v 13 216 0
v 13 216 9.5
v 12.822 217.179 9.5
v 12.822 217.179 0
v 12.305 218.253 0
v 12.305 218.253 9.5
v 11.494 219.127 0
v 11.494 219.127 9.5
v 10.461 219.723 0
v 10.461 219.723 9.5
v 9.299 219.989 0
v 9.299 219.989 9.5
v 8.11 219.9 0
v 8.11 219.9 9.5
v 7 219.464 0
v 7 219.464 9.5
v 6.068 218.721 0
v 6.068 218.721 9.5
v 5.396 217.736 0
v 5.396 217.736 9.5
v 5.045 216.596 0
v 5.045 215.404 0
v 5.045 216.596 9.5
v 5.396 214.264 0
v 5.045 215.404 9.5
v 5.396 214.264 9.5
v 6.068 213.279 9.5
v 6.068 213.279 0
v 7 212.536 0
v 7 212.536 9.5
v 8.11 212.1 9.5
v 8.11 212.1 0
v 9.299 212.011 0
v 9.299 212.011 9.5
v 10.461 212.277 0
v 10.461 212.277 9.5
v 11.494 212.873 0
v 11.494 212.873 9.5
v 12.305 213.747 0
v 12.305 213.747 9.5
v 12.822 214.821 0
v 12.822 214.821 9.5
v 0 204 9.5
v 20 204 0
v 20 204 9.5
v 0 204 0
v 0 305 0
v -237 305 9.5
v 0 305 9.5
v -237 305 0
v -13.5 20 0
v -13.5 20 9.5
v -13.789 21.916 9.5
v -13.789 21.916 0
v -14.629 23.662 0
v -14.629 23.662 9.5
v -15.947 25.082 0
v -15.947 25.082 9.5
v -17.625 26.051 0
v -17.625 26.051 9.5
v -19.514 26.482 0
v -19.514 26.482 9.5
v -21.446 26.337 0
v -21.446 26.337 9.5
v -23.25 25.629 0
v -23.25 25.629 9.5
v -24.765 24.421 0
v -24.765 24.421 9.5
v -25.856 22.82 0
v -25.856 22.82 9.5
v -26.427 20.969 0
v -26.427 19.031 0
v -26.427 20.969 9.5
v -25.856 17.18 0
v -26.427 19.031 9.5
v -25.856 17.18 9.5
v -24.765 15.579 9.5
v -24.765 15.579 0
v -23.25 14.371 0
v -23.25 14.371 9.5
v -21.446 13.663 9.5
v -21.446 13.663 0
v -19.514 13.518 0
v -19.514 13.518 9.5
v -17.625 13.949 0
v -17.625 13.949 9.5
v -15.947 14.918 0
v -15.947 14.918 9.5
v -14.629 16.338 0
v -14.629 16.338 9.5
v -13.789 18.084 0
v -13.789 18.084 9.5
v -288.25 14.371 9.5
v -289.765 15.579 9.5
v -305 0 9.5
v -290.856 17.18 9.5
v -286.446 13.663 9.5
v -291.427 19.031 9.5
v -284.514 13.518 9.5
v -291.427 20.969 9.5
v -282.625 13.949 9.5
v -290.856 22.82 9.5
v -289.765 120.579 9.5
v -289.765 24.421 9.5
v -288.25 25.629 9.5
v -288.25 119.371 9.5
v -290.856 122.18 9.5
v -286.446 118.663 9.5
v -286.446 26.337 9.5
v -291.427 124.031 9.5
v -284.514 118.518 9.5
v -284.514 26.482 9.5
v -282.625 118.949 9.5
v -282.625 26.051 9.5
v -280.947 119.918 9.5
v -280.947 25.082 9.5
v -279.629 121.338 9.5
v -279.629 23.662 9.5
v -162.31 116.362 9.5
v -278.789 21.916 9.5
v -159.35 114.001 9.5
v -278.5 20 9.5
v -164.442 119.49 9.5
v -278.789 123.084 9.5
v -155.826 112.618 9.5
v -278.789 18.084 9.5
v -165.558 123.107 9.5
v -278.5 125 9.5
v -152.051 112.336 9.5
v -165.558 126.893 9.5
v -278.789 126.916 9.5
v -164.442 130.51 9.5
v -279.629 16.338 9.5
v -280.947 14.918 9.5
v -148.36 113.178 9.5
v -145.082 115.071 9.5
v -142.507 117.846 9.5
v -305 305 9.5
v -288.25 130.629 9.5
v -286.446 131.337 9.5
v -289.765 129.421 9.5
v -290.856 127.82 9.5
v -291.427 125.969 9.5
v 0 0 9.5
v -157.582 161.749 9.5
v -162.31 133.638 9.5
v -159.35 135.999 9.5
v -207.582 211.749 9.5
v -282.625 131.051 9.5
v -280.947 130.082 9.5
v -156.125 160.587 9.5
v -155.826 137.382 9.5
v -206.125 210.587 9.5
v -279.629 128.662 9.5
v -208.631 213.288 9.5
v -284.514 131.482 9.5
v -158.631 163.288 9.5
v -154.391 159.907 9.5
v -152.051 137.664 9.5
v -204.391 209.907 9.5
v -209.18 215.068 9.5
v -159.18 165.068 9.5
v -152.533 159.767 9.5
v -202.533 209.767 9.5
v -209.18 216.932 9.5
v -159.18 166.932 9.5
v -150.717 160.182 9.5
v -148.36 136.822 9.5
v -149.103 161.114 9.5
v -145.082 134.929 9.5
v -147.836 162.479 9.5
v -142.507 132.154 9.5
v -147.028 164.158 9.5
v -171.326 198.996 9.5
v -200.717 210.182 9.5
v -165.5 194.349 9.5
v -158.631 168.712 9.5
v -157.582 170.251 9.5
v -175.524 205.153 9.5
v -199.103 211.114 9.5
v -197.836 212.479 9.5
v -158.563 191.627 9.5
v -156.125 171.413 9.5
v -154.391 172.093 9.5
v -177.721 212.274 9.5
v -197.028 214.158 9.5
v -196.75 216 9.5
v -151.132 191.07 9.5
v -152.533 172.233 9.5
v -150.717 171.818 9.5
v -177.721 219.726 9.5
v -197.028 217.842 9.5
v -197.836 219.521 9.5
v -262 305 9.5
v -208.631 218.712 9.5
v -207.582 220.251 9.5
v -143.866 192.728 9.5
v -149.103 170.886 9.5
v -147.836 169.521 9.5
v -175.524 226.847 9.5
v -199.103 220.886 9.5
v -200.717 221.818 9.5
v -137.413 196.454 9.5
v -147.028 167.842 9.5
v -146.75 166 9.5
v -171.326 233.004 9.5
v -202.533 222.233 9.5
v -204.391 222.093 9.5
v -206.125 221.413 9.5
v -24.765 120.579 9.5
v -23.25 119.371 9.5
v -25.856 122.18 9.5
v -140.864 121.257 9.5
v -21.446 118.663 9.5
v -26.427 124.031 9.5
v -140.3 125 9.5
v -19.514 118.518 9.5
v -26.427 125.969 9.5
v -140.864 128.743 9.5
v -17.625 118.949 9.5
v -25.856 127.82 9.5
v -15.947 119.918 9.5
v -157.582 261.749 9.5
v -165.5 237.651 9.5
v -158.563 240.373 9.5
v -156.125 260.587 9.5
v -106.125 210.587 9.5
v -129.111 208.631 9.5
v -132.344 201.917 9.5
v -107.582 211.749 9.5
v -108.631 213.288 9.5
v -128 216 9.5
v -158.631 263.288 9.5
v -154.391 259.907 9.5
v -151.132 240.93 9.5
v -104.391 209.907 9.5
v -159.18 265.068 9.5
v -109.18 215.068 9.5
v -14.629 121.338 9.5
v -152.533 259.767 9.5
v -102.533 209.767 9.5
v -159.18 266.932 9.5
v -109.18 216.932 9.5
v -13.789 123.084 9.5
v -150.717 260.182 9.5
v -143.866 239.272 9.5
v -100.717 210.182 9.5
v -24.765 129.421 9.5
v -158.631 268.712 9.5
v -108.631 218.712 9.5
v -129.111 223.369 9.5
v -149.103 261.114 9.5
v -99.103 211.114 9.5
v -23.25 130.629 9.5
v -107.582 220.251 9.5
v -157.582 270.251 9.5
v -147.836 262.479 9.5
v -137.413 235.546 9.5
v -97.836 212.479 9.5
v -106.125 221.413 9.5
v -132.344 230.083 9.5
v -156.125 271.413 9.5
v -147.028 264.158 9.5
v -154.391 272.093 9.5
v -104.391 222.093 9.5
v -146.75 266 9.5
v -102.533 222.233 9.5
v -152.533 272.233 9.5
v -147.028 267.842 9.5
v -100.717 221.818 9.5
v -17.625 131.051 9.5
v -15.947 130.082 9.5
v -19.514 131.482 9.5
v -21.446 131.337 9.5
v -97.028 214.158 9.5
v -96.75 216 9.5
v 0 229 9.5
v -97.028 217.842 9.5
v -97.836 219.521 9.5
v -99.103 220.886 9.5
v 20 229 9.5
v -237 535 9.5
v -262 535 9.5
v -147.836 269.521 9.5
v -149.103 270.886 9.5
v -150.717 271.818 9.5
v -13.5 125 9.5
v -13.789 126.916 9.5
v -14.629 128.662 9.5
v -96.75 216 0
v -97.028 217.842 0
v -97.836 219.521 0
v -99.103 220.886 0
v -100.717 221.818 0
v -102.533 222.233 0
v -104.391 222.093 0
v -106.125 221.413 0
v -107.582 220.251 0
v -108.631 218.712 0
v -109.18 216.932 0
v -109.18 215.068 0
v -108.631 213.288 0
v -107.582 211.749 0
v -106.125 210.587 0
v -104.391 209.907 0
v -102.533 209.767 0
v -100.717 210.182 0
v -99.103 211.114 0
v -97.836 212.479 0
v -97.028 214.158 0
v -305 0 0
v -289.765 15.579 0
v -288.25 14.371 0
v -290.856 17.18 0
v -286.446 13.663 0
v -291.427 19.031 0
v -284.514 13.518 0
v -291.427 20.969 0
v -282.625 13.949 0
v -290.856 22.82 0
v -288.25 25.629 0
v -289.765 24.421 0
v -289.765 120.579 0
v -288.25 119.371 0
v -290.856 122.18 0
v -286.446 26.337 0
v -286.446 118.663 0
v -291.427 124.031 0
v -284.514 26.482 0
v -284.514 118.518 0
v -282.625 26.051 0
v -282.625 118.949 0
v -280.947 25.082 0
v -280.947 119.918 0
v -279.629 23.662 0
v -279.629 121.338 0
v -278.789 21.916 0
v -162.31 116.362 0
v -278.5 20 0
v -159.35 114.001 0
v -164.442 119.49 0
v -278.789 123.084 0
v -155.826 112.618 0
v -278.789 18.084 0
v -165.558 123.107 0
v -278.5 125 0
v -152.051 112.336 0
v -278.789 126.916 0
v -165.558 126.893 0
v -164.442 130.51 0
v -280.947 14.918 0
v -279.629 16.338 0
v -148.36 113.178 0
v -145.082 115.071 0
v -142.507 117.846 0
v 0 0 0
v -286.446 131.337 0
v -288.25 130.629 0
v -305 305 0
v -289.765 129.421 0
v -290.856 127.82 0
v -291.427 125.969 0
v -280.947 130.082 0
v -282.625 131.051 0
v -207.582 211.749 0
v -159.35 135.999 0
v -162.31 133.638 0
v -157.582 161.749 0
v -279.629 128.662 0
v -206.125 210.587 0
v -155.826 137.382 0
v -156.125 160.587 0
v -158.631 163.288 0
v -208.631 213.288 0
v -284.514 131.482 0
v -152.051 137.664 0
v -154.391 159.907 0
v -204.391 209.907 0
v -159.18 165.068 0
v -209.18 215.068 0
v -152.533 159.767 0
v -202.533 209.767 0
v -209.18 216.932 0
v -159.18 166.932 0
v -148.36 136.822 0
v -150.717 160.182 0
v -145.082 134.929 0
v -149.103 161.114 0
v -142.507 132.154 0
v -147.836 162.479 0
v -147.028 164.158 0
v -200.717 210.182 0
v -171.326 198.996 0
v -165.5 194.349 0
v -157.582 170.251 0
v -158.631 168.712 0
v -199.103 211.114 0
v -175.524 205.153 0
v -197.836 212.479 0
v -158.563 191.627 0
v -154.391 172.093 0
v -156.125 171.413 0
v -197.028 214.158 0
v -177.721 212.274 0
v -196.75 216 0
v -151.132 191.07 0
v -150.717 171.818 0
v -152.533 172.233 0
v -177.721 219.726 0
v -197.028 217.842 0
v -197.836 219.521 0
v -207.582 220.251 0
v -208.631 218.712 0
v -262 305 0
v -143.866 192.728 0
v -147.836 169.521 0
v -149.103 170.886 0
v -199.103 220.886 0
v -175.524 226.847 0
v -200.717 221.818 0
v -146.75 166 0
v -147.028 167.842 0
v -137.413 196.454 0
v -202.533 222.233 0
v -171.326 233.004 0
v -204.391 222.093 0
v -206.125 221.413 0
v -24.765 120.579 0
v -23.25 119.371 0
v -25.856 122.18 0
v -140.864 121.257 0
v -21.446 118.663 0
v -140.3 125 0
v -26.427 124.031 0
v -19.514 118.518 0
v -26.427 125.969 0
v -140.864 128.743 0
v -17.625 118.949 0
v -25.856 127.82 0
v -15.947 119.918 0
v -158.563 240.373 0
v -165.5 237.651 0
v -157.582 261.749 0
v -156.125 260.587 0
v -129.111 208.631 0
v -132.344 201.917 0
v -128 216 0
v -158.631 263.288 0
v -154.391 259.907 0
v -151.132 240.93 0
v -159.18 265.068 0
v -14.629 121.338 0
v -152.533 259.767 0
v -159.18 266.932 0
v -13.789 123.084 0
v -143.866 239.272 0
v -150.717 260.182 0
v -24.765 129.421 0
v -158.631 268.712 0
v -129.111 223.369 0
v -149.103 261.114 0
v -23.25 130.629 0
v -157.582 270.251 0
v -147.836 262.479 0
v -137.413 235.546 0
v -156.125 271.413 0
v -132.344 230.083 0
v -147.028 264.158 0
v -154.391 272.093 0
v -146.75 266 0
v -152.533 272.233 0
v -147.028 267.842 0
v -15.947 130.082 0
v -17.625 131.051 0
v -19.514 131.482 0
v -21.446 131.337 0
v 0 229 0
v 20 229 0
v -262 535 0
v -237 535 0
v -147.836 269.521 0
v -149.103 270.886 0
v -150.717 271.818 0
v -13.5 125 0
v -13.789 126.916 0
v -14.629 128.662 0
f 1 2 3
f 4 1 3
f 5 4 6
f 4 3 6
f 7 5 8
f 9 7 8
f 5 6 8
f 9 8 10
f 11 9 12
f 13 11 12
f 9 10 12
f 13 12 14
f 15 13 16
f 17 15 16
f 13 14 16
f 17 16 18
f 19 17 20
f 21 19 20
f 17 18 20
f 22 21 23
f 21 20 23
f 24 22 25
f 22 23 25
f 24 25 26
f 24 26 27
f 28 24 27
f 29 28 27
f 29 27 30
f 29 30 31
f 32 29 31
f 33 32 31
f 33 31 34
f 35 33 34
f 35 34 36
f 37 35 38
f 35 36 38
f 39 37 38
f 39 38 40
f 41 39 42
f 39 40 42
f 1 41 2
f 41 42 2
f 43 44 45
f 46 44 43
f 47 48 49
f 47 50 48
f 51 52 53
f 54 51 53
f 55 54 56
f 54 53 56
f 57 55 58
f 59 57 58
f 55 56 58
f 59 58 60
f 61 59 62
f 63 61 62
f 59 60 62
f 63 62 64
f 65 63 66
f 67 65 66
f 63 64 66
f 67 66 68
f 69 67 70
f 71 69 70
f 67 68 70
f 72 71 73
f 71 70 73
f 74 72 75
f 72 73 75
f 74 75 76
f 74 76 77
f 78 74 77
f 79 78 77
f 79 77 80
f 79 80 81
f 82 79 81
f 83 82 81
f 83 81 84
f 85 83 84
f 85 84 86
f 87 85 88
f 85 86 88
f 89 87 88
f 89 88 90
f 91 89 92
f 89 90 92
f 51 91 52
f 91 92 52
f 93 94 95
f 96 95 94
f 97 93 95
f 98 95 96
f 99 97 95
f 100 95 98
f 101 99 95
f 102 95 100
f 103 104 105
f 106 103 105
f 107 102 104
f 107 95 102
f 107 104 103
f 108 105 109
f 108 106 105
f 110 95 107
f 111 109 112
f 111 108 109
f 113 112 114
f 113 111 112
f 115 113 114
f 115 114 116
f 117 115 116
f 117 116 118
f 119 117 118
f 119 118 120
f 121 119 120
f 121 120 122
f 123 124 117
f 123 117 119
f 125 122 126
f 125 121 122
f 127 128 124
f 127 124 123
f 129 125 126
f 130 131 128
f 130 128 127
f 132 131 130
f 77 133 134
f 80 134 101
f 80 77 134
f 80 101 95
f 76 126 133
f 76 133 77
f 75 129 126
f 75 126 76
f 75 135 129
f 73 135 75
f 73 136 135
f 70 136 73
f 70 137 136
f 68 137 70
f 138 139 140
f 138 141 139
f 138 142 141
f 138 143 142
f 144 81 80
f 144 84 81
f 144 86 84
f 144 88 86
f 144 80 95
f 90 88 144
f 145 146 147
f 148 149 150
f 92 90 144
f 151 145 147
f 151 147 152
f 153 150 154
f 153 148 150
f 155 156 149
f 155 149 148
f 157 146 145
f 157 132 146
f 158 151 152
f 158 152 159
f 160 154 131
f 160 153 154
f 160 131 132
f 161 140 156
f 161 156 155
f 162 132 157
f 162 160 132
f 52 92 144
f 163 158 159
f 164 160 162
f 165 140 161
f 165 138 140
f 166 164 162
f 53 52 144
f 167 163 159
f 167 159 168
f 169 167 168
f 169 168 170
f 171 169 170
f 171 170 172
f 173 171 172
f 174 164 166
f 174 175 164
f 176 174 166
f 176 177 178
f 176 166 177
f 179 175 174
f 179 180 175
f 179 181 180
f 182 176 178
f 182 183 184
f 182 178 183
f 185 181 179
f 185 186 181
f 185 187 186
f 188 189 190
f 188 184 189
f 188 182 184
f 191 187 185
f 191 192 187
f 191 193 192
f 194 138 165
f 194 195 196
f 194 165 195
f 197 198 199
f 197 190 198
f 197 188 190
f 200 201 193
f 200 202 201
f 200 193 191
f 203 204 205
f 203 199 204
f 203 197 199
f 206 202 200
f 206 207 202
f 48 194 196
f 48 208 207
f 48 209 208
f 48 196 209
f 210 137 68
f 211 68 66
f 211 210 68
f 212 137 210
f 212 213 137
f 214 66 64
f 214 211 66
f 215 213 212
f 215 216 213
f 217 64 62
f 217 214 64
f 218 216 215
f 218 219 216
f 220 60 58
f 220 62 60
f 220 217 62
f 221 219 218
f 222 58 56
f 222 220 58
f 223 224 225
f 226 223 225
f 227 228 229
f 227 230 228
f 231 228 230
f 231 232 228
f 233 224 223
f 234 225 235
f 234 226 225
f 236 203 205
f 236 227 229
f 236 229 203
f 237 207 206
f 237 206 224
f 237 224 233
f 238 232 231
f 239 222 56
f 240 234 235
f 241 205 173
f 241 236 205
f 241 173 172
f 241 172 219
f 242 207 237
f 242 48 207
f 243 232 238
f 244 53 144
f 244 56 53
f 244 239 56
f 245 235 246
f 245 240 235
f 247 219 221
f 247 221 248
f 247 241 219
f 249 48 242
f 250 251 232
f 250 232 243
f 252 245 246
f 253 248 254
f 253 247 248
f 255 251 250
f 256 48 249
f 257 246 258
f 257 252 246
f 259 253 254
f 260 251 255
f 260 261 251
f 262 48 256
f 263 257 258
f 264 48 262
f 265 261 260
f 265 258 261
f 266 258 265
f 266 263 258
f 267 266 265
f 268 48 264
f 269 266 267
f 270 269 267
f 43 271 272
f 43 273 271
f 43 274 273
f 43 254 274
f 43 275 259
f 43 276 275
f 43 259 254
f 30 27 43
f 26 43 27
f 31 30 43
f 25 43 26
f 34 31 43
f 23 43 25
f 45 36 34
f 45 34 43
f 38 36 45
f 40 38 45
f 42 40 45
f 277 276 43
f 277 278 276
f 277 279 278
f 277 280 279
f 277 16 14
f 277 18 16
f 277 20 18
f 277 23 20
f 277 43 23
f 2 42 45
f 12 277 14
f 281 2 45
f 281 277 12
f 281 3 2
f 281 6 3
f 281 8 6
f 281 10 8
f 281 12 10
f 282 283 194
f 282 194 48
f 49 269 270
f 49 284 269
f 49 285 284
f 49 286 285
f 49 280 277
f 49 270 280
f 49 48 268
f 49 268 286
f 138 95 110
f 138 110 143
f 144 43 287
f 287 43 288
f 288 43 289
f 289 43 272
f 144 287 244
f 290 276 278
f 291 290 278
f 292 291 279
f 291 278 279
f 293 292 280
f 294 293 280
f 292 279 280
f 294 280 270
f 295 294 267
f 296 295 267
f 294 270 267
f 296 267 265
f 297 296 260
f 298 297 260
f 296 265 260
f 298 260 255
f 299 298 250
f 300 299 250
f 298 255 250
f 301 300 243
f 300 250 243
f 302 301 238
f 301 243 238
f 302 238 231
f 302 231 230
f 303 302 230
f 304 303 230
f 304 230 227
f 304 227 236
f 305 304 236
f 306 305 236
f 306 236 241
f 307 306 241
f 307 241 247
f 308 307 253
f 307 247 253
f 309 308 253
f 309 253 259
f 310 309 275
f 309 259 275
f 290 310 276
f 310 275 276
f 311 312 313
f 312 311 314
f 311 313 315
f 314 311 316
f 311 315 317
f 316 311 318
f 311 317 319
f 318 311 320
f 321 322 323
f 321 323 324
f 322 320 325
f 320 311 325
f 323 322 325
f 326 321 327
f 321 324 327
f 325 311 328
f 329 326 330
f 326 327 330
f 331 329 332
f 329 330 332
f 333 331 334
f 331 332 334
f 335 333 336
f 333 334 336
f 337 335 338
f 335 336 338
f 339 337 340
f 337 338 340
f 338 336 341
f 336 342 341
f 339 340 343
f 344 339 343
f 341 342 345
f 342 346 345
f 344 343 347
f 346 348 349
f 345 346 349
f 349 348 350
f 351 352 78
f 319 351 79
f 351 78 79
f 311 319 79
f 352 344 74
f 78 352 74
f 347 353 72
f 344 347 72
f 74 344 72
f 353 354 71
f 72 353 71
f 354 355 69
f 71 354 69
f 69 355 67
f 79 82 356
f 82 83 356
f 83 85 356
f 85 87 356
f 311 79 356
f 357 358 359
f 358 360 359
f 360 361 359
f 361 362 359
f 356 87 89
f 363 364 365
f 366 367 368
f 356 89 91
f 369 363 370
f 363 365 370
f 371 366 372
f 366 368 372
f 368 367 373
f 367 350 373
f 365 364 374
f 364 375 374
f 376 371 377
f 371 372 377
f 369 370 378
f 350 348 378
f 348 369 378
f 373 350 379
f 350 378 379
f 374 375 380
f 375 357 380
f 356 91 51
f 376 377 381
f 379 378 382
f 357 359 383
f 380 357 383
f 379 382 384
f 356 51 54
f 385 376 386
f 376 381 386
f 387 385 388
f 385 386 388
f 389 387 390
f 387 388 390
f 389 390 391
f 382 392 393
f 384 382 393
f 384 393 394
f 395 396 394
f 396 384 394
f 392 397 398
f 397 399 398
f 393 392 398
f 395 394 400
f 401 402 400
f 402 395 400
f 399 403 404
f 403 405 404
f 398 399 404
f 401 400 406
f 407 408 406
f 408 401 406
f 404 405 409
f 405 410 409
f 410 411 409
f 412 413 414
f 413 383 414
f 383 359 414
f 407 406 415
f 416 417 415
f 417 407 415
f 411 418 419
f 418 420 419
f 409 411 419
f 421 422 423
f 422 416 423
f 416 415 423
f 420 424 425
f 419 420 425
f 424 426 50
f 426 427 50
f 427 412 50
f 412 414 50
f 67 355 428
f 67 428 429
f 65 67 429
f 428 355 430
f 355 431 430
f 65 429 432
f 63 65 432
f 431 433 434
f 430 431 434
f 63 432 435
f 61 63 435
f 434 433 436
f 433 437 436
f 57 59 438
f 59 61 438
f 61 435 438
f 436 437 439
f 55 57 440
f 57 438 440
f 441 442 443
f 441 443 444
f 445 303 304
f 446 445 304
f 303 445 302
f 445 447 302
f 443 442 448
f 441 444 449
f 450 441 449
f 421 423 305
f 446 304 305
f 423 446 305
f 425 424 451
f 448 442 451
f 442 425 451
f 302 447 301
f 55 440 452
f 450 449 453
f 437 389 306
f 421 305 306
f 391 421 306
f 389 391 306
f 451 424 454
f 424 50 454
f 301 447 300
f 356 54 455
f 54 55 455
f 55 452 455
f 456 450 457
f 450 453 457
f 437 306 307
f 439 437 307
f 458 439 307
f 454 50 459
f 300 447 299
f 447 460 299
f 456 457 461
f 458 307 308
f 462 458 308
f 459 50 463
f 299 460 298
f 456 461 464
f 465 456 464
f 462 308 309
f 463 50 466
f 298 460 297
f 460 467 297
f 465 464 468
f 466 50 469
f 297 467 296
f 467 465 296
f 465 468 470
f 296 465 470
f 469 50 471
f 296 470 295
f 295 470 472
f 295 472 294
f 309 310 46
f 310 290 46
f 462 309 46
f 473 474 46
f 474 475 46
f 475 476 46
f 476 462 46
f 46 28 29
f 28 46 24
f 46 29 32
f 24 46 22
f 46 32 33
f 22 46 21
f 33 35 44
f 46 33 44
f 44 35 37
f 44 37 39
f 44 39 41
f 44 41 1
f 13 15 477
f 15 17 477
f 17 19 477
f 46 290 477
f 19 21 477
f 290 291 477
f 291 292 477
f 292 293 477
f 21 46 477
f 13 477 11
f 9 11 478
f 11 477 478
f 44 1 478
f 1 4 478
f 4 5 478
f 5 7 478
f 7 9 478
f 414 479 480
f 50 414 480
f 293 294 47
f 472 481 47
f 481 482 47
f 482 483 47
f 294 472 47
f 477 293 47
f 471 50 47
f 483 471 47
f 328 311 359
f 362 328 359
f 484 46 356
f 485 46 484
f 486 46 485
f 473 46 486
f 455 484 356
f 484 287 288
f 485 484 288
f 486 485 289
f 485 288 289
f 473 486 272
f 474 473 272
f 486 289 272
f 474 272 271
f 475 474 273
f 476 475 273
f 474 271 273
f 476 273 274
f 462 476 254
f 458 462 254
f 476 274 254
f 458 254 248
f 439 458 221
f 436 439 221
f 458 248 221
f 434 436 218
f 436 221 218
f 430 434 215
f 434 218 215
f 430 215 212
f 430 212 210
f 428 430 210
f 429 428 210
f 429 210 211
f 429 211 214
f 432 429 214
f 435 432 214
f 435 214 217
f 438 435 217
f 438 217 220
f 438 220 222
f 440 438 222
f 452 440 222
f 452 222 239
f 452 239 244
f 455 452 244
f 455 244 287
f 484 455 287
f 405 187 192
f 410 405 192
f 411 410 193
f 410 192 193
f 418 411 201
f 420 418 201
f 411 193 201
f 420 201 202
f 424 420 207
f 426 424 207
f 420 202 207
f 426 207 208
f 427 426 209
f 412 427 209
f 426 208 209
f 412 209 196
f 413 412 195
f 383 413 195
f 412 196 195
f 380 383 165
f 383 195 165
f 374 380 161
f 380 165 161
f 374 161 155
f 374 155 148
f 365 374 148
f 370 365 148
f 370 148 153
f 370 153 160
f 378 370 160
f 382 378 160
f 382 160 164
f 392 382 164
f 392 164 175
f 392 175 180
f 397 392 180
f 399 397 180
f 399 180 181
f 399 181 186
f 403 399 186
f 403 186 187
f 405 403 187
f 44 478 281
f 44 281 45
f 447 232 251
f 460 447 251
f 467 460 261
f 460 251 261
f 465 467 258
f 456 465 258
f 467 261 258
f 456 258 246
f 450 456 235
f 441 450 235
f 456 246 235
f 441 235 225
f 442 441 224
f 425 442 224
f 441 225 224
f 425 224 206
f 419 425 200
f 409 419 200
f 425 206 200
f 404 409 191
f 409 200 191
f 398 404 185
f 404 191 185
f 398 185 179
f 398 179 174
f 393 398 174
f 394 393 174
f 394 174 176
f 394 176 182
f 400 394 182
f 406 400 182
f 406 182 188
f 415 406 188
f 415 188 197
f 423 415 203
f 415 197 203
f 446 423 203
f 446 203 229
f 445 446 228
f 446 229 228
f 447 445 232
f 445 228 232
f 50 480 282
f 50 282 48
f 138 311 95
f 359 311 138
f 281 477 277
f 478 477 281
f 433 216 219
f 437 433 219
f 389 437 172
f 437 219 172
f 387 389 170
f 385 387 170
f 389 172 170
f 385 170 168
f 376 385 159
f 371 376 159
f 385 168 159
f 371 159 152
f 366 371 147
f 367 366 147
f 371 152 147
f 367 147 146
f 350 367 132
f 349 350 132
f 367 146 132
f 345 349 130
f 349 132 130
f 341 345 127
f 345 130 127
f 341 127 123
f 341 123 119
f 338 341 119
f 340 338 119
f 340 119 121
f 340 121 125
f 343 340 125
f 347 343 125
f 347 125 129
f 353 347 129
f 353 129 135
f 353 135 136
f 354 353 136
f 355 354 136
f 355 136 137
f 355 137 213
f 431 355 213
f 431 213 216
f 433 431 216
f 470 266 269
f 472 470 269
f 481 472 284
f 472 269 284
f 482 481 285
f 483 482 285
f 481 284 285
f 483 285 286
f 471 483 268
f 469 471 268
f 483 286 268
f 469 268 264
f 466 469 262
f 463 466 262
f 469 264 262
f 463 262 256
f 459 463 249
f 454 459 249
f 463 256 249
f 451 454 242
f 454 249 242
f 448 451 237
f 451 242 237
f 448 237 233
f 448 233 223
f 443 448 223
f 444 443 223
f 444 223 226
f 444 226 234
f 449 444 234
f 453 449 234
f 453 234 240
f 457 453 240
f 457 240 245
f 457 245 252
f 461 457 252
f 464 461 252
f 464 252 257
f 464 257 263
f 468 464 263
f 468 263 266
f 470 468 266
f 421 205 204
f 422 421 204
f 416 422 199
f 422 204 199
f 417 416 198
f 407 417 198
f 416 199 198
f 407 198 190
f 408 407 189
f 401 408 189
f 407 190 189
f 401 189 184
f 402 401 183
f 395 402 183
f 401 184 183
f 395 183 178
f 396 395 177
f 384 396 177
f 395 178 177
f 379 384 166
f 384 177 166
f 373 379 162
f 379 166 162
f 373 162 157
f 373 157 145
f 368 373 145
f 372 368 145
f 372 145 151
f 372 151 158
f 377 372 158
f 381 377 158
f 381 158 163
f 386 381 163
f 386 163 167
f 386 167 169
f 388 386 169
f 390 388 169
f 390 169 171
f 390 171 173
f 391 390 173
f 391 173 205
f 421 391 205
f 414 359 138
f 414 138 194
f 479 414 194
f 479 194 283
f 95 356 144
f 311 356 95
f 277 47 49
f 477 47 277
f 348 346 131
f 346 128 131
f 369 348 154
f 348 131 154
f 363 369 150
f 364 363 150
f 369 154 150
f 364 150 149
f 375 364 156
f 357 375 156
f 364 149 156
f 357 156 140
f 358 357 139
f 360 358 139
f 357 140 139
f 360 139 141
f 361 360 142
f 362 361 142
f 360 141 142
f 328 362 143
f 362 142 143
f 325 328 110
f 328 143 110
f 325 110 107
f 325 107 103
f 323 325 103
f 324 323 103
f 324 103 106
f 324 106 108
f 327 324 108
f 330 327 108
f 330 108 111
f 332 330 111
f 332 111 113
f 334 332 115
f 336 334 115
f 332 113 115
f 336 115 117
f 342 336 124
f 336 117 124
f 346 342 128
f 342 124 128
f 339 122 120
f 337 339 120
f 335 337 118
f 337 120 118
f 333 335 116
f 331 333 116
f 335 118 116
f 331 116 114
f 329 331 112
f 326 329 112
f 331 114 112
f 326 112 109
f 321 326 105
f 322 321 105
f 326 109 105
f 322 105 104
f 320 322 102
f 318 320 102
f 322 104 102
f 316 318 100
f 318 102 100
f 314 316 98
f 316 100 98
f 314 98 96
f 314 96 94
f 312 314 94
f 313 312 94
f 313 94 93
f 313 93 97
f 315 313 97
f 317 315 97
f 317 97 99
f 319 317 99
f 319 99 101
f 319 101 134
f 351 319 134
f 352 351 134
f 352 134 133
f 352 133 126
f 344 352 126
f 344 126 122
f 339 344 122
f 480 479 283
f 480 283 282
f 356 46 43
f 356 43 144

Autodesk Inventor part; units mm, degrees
ref_plane "YZ Plane" through (0, 0, 0) normal (1, 0, 0) x (0, 1, 0)
ref_plane "XZ Plane" through (0, 0, 0) normal (0, 1, 0) x (-1, 0, 0)
ref_plane "XY Plane" through (0, 0, 0) normal (0, 0, 1) x (1, 0, 0)
sketch "Sketch1" plane through (0, 0, 0) normal (0, 0, 1) x (1, 0, 0)
  line L0 (0, 0) -> (-305, 0)
  line L1 (-305, 0) -> (-305, 305)
  line L2 (-305, 305) -> (-262, 305)
  line L3 (-262, 305) -> (-262, 535)
  line L4 (-262, 535) -> (-237, 535)
  line L5 (-237, 535) -> (-237, 305)
  line L6 (-237, 305) -> (0, 305)
  line L7 (0, 305) -> (0, 229)
  line L8 (0, 229) -> (20, 229)
  line L9 (20, 229) -> (20, 204)
  line L10 (20, 204) -> (0, 204)
  line L11 (0, 204) -> (0, 0)
  dimension "d0" = 305
  dimension "d1" = 305
  dimension "d4" = 230
  dimension "d5" = 25
  dimension "d6" = 230
  dimension "d7" = 76
  dimension "d8" = 20
  dimension "d9" = 25
  dimension "d10" = 43
extrude "Extrusion1" add sketch "Sketch1" along normal blind 9.5
sketch "Sketch2" plane through (0, 0, 9.5) normal (0, 0, 1) x (1, 0, 0)
  circle A0 centre (-20, 20) radius 6.5
  circle A1 centre (-20, 125) radius 6.5
  circle A2 centre (-285, 20) radius 6.5
  circle A3 centre (-285, 125) radius 6.5
  circle A4 centre (-153, 166) radius 6.25
  circle A5 centre (-153, 216) radius 25.5
  circle A6 centre (9, 216) radius 4
  line L0 (-305, 0) -> (0, 0) projected
  circle A7 centre (-103, 216) radius 6.25
  circle A8 centre (-153, 266) radius 6.25
  circle A9 centre (-203, 216) radius 6.25
  dimension "d13" = 13
  dimension "d14" = 13
  dimension "d15" = 13
  dimension "d16" = 13
  dimension "d18" = 12.5
  dimension "d21" = 8
  dimension "d22" = 20
  dimension "d23" = 20
  dimension "d24" = 20
  dimension "d25" = 20
  dimension "d26" = 125
  dimension "d27" = 20
  dimension "d28" = 20
  dimension "d29" = 125
  dimension "d30" = 216
  dimension "d31" = 216
  dimension "d32" = 166
  dimension "d35" = 360
  dimension "d37" = 51
  dimension "d38" = 103
  dimension "d39" = 162
  dimension "d40" = 162
extrude "Extrusion2" cut sketch "Sketch2" against normal through all contours A0 | A1 | A2 | A3 | A4 | A6 | A7 | A8 | A9
sketch "Sketch3" plane through (0, 0, 9.5) normal (0, 0, 1) x (1, 0, 0)
  circle A0 centre (-203, 216) radius 6.25 projected
  circle A1 centre (-103, 216) radius 6.25 projected
  circle A2 centre (-153, 216) radius 25
  circle A3 centre (-285, 125) radius 6.5 projected
  circle A4 centre (-20, 125) radius 6.5 projected
  circle A5 centre (-153, 125) radius 12.7
  point P0 (0, 0)
  dimension "d43" = 50
  dimension "d44" = 216
  dimension "d45" = 153
  dimension "d46" = 25.4
  dimension "d47" = 125
  dimension "d48" = 153
extrude "Extrusion3" cut sketch "Sketch3" against normal through all contours A2 | A5
properties part number "HubPlate"
